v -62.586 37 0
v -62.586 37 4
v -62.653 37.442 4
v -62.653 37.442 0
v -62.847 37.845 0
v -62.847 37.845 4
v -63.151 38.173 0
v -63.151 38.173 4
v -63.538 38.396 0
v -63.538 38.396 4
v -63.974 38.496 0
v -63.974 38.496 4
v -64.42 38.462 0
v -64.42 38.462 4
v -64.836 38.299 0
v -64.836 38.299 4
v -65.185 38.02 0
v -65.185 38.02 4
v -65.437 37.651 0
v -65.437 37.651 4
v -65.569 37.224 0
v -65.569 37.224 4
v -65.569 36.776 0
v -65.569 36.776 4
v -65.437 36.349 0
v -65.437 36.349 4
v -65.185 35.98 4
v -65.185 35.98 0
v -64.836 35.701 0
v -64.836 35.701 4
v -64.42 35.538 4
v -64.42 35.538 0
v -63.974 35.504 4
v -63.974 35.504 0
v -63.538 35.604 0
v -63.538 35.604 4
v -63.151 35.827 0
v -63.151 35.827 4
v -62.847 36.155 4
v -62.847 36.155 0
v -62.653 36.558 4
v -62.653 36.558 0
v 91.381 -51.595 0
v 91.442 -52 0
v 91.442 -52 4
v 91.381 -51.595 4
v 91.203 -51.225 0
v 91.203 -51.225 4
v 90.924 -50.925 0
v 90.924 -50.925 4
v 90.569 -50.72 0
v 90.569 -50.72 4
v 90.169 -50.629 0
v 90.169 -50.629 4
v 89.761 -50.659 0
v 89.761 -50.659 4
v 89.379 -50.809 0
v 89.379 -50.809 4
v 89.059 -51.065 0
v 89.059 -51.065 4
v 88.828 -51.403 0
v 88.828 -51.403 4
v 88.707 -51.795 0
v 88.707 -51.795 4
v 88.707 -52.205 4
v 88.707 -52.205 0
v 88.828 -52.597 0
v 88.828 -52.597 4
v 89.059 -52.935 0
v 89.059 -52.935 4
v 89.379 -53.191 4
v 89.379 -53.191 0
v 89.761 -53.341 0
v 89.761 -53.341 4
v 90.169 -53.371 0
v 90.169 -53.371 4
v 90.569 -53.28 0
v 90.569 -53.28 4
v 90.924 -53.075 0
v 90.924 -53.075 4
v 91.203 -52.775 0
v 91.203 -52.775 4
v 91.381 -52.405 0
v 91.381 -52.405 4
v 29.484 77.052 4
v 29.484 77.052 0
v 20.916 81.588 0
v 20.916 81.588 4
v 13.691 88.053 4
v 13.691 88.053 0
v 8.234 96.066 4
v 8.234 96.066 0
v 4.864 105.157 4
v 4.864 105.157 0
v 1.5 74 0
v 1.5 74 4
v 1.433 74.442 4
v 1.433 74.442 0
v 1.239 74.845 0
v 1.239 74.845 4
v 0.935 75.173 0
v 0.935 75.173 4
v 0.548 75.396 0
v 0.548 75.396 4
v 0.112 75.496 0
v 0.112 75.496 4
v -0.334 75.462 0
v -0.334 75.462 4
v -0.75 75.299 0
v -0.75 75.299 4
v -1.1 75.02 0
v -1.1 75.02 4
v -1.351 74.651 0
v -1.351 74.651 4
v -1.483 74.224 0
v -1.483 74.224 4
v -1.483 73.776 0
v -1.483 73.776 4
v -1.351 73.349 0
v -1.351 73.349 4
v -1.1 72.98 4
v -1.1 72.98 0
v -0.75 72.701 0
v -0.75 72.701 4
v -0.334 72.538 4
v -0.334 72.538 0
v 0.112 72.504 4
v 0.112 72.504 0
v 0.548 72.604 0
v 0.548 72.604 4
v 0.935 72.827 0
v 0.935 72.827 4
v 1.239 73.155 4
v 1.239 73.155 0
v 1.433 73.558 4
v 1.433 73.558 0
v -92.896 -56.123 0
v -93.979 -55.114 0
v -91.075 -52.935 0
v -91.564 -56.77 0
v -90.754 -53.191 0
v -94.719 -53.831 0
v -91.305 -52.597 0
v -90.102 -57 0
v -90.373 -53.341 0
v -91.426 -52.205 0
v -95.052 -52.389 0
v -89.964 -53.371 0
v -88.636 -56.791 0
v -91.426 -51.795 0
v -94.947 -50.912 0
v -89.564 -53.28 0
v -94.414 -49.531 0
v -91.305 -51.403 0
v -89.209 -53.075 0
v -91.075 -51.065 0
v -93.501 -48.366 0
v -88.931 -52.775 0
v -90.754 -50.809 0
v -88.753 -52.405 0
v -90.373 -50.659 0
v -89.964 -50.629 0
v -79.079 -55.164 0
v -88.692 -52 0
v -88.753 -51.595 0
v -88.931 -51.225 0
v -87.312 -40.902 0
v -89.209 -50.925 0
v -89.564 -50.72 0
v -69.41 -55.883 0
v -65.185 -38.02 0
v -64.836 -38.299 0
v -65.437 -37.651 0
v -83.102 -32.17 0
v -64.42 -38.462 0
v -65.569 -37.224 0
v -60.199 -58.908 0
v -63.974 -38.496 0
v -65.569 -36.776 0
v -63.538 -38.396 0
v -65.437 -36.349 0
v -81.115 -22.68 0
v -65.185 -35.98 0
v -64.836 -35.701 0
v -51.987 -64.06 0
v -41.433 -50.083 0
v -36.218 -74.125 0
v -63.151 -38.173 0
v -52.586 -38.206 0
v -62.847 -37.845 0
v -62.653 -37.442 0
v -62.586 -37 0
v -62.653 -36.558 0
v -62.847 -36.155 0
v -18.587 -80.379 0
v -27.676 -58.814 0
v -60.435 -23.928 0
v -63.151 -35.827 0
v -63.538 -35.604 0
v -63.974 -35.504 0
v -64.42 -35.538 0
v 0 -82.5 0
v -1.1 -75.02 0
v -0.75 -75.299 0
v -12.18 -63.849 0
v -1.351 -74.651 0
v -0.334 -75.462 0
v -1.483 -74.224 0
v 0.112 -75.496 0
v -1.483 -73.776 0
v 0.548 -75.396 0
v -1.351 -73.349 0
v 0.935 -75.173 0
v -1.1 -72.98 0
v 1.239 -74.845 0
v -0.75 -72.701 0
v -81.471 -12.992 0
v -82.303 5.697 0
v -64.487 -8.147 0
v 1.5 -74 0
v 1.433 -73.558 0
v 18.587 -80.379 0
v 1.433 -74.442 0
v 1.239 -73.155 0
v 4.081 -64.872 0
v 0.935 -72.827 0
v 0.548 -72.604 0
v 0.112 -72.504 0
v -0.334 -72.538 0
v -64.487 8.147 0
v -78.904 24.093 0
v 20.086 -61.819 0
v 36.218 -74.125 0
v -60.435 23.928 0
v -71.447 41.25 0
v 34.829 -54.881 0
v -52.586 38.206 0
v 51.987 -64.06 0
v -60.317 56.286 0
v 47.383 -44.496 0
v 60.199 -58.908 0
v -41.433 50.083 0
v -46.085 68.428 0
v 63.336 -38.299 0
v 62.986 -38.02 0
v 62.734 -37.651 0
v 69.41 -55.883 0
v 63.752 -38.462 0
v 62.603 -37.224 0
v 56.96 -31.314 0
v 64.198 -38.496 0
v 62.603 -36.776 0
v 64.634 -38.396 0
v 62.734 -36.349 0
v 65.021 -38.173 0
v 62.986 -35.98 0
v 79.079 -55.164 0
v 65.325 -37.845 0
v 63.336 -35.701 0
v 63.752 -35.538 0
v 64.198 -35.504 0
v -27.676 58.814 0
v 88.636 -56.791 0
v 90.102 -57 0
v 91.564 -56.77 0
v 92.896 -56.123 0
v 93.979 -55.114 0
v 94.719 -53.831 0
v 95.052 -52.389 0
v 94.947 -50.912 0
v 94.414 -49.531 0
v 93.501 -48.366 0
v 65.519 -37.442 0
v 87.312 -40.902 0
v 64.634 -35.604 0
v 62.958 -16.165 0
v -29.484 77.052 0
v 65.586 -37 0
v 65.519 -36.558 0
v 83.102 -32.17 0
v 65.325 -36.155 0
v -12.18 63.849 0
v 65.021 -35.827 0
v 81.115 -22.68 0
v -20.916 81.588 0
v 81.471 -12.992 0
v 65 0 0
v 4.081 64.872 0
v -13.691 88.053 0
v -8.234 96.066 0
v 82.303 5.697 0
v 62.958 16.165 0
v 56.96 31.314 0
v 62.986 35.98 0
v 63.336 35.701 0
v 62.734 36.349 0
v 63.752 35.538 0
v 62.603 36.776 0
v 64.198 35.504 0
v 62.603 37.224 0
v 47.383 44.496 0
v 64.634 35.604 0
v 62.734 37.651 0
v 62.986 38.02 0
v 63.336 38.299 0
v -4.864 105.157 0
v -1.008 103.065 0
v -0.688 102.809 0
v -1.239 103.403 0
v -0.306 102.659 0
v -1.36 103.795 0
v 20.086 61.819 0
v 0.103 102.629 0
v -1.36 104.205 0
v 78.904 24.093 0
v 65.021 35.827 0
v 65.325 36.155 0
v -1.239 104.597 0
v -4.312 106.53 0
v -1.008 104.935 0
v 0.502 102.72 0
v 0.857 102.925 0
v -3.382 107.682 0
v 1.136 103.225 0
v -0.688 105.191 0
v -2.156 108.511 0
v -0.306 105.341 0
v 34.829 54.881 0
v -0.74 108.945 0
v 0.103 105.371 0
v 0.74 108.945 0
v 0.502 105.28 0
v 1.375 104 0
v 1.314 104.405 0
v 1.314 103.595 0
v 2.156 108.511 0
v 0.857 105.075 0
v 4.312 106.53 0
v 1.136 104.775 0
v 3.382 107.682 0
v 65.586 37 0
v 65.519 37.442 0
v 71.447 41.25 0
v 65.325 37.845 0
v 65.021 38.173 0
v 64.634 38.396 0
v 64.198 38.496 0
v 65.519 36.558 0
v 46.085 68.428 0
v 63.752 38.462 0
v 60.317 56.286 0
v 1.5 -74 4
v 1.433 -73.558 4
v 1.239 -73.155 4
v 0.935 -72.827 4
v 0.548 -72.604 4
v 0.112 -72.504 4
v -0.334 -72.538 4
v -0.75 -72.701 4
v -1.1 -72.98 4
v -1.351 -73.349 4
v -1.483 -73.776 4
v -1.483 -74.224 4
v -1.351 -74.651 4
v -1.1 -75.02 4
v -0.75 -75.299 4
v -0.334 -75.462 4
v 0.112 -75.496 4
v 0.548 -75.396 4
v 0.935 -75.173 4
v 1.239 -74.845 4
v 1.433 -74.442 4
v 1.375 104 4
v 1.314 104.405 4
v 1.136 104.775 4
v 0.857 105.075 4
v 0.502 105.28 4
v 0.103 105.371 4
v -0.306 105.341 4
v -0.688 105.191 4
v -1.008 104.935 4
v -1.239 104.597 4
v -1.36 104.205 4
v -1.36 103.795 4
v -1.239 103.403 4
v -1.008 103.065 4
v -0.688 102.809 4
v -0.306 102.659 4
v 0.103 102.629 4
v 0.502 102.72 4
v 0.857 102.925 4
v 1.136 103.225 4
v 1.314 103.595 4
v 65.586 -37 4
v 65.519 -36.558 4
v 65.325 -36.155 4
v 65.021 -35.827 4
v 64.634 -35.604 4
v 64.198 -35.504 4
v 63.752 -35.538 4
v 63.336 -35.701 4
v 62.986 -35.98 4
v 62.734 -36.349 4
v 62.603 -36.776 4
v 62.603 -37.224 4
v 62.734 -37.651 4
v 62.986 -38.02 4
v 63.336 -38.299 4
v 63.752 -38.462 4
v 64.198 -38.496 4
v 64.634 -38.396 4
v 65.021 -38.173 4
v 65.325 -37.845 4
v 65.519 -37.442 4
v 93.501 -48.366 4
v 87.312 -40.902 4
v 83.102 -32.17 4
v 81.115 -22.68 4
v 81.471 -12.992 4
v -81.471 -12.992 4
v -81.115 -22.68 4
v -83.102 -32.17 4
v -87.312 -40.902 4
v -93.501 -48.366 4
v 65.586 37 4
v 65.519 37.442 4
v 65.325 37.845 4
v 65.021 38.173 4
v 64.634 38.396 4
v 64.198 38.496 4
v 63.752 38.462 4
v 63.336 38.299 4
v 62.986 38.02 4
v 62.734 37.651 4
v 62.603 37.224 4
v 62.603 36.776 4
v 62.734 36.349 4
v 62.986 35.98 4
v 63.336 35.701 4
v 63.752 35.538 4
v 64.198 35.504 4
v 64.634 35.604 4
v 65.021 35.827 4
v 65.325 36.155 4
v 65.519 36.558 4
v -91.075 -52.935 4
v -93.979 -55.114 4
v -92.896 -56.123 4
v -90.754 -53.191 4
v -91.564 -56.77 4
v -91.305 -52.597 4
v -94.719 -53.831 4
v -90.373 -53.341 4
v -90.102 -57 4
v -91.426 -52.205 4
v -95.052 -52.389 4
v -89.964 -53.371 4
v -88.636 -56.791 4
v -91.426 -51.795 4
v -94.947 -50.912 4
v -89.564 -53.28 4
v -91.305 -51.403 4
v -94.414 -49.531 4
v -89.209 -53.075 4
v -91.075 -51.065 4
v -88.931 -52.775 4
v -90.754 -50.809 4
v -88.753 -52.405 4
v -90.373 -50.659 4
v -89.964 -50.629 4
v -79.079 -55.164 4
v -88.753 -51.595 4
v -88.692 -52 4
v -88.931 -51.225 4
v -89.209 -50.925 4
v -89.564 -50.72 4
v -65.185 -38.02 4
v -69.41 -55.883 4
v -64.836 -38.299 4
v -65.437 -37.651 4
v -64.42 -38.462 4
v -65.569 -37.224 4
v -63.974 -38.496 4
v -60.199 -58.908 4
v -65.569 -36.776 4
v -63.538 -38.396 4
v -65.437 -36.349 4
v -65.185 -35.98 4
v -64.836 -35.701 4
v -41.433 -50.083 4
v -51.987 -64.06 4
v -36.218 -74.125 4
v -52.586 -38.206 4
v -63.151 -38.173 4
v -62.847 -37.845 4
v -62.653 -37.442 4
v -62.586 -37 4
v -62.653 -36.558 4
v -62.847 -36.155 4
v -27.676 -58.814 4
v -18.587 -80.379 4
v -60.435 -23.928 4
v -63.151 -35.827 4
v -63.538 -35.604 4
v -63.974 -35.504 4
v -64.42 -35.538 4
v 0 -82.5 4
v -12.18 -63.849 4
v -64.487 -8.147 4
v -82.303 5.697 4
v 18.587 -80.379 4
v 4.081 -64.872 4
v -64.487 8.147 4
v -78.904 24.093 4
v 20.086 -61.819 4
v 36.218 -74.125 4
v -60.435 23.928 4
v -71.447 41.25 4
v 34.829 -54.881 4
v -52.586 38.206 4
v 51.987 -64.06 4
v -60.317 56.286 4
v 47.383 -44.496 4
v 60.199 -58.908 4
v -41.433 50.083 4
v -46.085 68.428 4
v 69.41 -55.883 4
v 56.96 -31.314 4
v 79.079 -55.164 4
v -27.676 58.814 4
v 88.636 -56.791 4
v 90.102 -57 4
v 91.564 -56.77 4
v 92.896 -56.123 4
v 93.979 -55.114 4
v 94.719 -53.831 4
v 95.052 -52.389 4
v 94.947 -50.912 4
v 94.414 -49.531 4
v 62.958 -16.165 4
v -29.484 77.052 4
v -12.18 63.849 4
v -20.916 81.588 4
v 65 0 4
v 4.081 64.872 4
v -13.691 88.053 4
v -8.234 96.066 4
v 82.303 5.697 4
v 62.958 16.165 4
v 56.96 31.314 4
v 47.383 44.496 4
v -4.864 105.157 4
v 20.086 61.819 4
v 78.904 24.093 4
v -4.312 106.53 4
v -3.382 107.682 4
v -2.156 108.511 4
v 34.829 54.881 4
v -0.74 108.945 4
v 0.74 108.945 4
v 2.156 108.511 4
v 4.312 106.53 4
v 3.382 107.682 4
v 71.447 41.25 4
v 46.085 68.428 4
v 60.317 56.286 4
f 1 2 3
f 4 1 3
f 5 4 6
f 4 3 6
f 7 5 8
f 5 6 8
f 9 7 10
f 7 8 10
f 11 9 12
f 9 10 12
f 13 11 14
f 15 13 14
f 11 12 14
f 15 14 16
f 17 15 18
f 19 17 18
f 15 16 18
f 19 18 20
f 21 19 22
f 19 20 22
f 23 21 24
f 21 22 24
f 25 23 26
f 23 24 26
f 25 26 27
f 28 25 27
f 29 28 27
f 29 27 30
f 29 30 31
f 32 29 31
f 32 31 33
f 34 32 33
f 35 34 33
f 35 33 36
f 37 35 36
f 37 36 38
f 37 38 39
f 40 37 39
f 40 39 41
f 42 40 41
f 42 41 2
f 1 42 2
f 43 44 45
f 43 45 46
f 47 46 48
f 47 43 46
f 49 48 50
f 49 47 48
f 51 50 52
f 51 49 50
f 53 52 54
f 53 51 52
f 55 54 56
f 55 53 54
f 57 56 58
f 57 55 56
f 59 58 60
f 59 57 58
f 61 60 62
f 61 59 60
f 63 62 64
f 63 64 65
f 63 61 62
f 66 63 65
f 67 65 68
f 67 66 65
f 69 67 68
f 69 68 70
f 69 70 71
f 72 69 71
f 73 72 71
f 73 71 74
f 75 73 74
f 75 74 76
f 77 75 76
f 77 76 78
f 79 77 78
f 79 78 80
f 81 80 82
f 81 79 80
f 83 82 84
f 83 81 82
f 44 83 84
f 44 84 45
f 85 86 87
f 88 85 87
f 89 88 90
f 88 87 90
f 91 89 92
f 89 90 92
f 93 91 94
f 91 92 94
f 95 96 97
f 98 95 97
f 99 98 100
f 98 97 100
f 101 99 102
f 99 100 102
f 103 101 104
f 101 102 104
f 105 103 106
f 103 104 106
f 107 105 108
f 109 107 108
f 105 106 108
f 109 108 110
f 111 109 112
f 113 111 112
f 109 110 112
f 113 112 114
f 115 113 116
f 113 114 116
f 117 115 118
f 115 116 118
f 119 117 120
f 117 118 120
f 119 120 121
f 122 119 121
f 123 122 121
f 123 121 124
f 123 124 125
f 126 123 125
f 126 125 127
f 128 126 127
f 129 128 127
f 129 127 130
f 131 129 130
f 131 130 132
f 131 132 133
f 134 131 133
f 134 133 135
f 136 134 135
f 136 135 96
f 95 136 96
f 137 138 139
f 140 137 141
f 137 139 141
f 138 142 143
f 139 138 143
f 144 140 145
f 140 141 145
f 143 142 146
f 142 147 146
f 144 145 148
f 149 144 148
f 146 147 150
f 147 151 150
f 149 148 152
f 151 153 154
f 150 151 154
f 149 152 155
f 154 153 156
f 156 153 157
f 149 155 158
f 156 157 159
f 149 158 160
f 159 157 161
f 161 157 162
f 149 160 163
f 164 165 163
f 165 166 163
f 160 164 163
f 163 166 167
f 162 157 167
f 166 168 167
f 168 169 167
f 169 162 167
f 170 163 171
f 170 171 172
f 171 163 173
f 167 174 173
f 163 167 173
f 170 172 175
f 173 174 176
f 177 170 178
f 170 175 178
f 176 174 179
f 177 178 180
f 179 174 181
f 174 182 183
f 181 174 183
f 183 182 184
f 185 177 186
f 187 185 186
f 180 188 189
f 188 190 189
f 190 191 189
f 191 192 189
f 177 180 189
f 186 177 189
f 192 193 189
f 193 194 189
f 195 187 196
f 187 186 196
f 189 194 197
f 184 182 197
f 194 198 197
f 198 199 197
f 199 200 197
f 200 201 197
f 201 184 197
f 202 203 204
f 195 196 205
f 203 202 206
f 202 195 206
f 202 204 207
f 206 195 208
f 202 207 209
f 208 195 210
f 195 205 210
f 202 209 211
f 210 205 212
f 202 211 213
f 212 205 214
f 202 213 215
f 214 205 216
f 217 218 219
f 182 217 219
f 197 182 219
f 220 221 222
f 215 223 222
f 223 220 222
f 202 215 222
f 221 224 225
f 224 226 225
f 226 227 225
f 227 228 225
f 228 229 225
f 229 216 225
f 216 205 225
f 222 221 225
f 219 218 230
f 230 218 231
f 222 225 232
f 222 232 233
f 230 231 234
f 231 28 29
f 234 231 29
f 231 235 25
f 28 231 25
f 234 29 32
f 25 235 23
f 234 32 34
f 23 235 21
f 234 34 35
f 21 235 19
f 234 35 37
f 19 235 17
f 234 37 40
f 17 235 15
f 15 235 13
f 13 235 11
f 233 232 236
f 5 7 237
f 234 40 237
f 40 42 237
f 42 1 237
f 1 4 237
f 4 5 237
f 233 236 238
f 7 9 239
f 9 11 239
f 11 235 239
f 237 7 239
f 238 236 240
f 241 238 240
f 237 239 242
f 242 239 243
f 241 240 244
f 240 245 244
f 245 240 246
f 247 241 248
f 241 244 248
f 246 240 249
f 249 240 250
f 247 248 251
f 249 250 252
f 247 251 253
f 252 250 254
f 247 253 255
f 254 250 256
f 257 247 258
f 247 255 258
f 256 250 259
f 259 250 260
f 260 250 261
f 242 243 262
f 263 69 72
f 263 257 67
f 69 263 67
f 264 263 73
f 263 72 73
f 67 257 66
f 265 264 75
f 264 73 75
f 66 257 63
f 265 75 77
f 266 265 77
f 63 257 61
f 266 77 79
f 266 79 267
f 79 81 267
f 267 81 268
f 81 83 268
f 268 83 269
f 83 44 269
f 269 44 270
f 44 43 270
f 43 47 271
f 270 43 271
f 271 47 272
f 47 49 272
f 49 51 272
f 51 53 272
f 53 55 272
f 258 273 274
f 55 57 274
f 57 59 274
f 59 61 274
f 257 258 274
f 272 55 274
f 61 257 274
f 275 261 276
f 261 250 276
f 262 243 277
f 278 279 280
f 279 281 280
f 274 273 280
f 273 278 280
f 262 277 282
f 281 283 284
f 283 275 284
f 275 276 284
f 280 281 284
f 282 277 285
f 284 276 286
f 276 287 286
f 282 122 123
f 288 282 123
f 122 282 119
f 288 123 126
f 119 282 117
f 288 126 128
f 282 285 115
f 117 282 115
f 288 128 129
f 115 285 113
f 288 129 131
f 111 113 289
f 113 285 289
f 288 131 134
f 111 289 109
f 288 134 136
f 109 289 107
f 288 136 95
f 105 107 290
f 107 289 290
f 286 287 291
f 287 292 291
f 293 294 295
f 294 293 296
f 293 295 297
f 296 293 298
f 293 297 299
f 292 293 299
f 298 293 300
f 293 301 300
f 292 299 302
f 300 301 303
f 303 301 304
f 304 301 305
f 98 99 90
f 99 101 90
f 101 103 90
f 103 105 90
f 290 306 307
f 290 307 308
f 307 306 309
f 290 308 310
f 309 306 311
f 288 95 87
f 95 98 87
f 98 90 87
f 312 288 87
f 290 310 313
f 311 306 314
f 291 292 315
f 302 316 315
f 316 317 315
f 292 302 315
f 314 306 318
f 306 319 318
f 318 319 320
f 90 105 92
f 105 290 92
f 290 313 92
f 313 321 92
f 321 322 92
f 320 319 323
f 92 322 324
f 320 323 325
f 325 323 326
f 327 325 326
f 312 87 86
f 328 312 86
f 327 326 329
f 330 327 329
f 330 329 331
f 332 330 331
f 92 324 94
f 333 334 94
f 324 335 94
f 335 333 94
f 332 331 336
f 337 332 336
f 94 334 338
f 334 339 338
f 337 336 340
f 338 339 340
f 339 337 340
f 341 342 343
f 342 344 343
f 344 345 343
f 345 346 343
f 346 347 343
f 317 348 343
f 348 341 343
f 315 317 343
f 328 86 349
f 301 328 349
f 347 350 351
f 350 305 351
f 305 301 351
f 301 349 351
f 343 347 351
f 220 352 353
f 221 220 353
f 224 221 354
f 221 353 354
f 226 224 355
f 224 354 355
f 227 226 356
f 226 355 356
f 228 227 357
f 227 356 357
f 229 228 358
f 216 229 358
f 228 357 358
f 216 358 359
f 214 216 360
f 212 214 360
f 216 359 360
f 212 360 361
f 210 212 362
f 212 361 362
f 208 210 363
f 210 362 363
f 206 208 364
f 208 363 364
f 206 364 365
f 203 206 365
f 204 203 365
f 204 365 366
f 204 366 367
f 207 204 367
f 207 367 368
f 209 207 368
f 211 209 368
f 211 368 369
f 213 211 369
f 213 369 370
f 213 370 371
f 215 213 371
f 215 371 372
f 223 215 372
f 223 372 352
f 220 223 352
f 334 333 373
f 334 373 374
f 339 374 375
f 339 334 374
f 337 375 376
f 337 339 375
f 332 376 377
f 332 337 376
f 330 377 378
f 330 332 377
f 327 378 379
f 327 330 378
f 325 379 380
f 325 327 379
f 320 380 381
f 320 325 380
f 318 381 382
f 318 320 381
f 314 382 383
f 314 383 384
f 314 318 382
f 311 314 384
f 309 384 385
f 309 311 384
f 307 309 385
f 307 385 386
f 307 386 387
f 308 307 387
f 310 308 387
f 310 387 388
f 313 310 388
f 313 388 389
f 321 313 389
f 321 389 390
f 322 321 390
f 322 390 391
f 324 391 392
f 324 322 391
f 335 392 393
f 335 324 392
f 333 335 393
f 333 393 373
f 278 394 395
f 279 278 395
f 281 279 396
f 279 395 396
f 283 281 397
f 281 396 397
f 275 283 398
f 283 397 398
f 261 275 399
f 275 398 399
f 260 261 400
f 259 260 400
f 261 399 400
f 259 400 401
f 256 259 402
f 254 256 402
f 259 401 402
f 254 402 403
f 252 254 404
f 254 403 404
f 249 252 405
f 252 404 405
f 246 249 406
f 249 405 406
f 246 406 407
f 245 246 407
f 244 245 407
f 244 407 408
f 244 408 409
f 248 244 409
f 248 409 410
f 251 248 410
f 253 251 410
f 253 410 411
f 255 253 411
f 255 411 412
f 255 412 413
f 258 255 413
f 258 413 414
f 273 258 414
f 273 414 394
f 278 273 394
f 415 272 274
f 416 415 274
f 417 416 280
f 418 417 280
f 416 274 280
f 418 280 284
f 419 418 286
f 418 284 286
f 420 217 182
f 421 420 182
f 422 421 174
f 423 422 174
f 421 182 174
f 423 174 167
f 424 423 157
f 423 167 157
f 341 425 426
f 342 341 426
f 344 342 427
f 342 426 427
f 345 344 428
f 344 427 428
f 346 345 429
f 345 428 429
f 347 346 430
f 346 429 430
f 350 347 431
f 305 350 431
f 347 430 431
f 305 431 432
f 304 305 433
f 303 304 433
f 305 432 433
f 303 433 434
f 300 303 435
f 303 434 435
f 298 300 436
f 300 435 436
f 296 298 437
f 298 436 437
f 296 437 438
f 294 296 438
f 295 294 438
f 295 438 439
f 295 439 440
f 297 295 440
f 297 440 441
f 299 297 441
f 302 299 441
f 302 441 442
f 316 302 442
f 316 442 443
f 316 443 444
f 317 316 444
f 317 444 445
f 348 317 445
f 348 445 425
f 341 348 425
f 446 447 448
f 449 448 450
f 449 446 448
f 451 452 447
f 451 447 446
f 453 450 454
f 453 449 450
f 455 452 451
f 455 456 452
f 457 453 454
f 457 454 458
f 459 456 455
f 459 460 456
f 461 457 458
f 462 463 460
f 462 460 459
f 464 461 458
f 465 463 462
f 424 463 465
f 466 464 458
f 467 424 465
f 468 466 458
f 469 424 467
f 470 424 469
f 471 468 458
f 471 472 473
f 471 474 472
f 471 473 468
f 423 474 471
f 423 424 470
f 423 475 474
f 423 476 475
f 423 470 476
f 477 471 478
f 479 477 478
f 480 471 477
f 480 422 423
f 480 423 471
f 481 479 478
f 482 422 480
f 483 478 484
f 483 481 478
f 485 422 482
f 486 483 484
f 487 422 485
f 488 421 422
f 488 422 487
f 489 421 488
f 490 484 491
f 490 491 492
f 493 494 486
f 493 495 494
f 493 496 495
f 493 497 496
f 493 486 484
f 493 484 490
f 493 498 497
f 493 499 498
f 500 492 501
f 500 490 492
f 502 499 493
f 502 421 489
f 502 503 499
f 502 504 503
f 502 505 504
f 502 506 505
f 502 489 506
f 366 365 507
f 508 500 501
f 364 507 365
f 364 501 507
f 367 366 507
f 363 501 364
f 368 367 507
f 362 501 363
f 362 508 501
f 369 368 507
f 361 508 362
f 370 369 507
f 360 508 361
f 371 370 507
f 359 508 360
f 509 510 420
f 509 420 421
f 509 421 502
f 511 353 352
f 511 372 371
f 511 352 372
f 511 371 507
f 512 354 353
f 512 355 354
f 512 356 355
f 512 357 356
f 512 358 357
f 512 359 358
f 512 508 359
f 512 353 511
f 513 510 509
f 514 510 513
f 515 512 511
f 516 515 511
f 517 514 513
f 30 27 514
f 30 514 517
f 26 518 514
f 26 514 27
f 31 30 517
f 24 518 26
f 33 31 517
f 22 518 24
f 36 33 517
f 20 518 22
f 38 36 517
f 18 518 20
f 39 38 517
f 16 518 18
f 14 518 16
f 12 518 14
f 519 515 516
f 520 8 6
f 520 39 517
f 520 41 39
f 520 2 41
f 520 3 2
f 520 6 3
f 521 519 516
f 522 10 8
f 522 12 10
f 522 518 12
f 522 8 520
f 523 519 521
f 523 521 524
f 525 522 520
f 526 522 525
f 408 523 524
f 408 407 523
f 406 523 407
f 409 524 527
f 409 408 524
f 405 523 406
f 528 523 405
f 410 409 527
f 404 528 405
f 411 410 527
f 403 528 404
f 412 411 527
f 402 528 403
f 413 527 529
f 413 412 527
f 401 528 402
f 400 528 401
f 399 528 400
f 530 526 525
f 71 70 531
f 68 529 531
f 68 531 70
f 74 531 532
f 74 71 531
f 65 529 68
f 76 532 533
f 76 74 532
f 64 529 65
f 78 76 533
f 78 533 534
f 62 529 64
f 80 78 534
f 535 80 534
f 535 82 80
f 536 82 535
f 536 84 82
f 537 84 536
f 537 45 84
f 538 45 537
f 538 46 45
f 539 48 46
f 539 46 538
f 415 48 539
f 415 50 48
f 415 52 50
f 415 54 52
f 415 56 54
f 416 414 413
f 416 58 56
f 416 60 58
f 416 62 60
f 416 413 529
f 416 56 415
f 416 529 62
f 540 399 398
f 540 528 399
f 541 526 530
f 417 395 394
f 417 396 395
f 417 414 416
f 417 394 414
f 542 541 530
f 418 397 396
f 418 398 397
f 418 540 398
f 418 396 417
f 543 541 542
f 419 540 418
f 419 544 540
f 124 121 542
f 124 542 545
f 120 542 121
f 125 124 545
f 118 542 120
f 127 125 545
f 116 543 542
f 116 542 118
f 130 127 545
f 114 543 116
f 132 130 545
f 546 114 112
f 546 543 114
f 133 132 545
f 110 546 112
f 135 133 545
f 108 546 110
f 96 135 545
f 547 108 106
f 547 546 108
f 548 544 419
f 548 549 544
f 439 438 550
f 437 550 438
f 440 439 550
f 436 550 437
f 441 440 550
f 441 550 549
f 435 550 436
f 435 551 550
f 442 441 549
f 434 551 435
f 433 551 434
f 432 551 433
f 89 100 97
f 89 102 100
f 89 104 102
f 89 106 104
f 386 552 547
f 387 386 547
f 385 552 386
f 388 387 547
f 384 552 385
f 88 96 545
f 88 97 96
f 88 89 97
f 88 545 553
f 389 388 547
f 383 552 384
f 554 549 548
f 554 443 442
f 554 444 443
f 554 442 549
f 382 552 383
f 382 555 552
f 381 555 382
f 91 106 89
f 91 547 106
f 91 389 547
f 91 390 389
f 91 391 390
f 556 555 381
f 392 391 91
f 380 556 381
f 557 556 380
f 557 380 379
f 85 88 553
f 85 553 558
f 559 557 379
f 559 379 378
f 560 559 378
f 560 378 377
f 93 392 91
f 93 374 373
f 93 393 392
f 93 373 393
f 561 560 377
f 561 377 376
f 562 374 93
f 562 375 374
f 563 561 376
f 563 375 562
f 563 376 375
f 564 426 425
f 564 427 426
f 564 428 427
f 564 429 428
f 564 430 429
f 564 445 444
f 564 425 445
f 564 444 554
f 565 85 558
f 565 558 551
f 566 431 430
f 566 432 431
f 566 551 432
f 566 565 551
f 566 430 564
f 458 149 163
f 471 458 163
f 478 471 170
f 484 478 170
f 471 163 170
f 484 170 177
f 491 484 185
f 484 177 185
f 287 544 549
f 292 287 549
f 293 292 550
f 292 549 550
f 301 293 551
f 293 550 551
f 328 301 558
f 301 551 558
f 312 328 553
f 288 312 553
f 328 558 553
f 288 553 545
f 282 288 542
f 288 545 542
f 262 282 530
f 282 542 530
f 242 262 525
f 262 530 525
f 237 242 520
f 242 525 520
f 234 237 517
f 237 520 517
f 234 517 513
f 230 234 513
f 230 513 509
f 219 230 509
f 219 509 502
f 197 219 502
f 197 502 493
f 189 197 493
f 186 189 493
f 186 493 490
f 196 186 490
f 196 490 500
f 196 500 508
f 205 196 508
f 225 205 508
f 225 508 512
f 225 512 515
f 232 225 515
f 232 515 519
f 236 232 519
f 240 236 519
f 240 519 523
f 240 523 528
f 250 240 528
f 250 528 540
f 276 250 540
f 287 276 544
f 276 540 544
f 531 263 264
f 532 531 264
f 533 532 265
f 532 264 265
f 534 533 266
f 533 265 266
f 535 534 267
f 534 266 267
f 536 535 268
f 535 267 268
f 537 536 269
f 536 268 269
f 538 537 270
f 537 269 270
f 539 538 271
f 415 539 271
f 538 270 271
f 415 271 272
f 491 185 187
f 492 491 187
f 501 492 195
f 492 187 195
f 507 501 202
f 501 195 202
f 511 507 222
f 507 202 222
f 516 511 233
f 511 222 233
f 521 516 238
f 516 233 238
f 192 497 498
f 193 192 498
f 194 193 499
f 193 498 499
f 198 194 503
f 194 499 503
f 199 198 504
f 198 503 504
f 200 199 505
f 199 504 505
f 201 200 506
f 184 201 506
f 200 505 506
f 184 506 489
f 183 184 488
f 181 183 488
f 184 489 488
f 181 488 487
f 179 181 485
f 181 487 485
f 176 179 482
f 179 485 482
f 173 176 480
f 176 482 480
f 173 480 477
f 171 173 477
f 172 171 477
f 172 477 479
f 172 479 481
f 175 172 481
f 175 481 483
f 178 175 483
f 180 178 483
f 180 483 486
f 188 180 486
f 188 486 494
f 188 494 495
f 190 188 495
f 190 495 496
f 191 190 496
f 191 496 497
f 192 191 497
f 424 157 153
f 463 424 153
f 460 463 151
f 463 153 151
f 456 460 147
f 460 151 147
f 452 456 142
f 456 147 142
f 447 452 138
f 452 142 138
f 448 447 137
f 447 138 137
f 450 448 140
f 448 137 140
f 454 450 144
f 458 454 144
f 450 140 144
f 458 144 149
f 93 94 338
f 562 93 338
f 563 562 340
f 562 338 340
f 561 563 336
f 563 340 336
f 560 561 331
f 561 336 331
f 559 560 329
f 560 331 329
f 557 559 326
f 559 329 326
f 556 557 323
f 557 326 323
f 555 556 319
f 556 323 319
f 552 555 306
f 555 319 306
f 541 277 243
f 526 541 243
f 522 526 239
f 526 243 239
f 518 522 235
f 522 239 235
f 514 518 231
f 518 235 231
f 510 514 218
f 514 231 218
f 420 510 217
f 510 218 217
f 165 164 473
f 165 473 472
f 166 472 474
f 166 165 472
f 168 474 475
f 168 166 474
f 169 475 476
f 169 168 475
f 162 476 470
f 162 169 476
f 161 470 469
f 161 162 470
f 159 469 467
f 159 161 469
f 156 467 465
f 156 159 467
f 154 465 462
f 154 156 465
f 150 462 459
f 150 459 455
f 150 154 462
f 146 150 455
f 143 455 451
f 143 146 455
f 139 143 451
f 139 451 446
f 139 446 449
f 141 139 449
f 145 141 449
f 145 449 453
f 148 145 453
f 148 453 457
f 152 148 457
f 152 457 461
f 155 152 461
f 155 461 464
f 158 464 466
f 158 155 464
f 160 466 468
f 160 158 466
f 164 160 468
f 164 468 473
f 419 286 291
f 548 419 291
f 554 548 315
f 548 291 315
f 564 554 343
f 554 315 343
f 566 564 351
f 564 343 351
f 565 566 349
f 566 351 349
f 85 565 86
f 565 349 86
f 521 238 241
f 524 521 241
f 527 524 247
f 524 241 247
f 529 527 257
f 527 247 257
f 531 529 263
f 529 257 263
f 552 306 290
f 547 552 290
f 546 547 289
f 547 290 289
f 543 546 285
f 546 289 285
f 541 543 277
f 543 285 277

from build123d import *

# Parameters (mm, degrees)
SKETCH1_R           = 1.375
BOSS_EXTRUDE1_DEPTH = 4
SKETCH3_R           = 1.5
SKETCH3_R_2         = 65
CUT_EXTRUDE1_DEPTH  = 145.688169592


with BuildPart() as part:
    # Sketch1 → Boss-Extrude1 (new body)
    with BuildSketch(Plane.XY):
        with BuildLine():
            ThreePointArc((-29.484078319, 77.051535518), (-71.447095812, 41.25), (-81.470626319, -12.991806928))
            ThreePointArc((-81.470626319, -12.991806928), (-83.101535217, -32.169647267), (-93.500519111, -48.365651648))
            ThreePointArc((-93.500519111, -48.365651648), (-94.396769013, -54.5), (-88.636142553, -56.790998993))
            ThreePointArc((-88.636142553, -56.790998993), (-69.410499373, -55.883216958), (-51.986548, -64.05972859))
            ThreePointArc((-51.986548, -64.05972859), (0, -82.5), (51.986548, -64.05972859))
            ThreePointArc((51.986548, -64.05972859), (69.410499373, -55.883216958), (88.636142553, -56.790998993))
            ThreePointArc((88.636142553, -56.790998993), (94.396769013, -54.5), (93.500519111, -48.365651648))
            ThreePointArc((93.500519111, -48.365651648), (83.101535217, -32.169647267), (81.470626319, -12.991806928))
            ThreePointArc((81.470626319, -12.991806928), (71.447095812, 41.25), (29.484078319, 77.051535518))
            ThreePointArc((29.484078319, 77.051535518), (13.691035844, 88.052864225), (4.864376558, 105.156650641))
            ThreePointArc((4.864376558, 105.156650641), (0, 109), (-4.864376558, 105.156650641))
            ThreePointArc((-4.864376558, 105.156650641), (-13.691035844, 88.052864225), (-29.484078319, 77.051535518))
        make_face()
        with Locations((0, 104)):
            Circle(SKETCH1_R, mode=Mode.SUBTRACT)
        with Locations((90.066641994, -52)):
            Circle(SKETCH1_R, mode=Mode.SUBTRACT)
        with Locations((-90.066641994, -52)):
            Circle(SKETCH1_R, mode=Mode.SUBTRACT)
    extrude(amount=BOSS_EXTRUDE1_DEPTH)

    # Sketch3 → Cut-Extrude1 (cut, through all)
    with BuildSketch(Plane.XY.offset(4)):
        with Locations((0, 74)):
            Circle(SKETCH3_R)
        with Locations((-64.08587988, -37)):
            Circle(SKETCH3_R)
        with Locations((64.08587988, -37)):
            Circle(SKETCH3_R)
        with Locations((-64.08587988, 37)):
            Circle(SKETCH3_R)
        with Locations((64.08587988, 37)):
            Circle(SKETCH3_R)
        with Locations((0, -74)):
            Circle(SKETCH3_R)
        Circle(SKETCH3_R_2)
    extrude(amount=-CUT_EXTRUDE1_DEPTH, mode=Mode.SUBTRACT)


solid = part.part
